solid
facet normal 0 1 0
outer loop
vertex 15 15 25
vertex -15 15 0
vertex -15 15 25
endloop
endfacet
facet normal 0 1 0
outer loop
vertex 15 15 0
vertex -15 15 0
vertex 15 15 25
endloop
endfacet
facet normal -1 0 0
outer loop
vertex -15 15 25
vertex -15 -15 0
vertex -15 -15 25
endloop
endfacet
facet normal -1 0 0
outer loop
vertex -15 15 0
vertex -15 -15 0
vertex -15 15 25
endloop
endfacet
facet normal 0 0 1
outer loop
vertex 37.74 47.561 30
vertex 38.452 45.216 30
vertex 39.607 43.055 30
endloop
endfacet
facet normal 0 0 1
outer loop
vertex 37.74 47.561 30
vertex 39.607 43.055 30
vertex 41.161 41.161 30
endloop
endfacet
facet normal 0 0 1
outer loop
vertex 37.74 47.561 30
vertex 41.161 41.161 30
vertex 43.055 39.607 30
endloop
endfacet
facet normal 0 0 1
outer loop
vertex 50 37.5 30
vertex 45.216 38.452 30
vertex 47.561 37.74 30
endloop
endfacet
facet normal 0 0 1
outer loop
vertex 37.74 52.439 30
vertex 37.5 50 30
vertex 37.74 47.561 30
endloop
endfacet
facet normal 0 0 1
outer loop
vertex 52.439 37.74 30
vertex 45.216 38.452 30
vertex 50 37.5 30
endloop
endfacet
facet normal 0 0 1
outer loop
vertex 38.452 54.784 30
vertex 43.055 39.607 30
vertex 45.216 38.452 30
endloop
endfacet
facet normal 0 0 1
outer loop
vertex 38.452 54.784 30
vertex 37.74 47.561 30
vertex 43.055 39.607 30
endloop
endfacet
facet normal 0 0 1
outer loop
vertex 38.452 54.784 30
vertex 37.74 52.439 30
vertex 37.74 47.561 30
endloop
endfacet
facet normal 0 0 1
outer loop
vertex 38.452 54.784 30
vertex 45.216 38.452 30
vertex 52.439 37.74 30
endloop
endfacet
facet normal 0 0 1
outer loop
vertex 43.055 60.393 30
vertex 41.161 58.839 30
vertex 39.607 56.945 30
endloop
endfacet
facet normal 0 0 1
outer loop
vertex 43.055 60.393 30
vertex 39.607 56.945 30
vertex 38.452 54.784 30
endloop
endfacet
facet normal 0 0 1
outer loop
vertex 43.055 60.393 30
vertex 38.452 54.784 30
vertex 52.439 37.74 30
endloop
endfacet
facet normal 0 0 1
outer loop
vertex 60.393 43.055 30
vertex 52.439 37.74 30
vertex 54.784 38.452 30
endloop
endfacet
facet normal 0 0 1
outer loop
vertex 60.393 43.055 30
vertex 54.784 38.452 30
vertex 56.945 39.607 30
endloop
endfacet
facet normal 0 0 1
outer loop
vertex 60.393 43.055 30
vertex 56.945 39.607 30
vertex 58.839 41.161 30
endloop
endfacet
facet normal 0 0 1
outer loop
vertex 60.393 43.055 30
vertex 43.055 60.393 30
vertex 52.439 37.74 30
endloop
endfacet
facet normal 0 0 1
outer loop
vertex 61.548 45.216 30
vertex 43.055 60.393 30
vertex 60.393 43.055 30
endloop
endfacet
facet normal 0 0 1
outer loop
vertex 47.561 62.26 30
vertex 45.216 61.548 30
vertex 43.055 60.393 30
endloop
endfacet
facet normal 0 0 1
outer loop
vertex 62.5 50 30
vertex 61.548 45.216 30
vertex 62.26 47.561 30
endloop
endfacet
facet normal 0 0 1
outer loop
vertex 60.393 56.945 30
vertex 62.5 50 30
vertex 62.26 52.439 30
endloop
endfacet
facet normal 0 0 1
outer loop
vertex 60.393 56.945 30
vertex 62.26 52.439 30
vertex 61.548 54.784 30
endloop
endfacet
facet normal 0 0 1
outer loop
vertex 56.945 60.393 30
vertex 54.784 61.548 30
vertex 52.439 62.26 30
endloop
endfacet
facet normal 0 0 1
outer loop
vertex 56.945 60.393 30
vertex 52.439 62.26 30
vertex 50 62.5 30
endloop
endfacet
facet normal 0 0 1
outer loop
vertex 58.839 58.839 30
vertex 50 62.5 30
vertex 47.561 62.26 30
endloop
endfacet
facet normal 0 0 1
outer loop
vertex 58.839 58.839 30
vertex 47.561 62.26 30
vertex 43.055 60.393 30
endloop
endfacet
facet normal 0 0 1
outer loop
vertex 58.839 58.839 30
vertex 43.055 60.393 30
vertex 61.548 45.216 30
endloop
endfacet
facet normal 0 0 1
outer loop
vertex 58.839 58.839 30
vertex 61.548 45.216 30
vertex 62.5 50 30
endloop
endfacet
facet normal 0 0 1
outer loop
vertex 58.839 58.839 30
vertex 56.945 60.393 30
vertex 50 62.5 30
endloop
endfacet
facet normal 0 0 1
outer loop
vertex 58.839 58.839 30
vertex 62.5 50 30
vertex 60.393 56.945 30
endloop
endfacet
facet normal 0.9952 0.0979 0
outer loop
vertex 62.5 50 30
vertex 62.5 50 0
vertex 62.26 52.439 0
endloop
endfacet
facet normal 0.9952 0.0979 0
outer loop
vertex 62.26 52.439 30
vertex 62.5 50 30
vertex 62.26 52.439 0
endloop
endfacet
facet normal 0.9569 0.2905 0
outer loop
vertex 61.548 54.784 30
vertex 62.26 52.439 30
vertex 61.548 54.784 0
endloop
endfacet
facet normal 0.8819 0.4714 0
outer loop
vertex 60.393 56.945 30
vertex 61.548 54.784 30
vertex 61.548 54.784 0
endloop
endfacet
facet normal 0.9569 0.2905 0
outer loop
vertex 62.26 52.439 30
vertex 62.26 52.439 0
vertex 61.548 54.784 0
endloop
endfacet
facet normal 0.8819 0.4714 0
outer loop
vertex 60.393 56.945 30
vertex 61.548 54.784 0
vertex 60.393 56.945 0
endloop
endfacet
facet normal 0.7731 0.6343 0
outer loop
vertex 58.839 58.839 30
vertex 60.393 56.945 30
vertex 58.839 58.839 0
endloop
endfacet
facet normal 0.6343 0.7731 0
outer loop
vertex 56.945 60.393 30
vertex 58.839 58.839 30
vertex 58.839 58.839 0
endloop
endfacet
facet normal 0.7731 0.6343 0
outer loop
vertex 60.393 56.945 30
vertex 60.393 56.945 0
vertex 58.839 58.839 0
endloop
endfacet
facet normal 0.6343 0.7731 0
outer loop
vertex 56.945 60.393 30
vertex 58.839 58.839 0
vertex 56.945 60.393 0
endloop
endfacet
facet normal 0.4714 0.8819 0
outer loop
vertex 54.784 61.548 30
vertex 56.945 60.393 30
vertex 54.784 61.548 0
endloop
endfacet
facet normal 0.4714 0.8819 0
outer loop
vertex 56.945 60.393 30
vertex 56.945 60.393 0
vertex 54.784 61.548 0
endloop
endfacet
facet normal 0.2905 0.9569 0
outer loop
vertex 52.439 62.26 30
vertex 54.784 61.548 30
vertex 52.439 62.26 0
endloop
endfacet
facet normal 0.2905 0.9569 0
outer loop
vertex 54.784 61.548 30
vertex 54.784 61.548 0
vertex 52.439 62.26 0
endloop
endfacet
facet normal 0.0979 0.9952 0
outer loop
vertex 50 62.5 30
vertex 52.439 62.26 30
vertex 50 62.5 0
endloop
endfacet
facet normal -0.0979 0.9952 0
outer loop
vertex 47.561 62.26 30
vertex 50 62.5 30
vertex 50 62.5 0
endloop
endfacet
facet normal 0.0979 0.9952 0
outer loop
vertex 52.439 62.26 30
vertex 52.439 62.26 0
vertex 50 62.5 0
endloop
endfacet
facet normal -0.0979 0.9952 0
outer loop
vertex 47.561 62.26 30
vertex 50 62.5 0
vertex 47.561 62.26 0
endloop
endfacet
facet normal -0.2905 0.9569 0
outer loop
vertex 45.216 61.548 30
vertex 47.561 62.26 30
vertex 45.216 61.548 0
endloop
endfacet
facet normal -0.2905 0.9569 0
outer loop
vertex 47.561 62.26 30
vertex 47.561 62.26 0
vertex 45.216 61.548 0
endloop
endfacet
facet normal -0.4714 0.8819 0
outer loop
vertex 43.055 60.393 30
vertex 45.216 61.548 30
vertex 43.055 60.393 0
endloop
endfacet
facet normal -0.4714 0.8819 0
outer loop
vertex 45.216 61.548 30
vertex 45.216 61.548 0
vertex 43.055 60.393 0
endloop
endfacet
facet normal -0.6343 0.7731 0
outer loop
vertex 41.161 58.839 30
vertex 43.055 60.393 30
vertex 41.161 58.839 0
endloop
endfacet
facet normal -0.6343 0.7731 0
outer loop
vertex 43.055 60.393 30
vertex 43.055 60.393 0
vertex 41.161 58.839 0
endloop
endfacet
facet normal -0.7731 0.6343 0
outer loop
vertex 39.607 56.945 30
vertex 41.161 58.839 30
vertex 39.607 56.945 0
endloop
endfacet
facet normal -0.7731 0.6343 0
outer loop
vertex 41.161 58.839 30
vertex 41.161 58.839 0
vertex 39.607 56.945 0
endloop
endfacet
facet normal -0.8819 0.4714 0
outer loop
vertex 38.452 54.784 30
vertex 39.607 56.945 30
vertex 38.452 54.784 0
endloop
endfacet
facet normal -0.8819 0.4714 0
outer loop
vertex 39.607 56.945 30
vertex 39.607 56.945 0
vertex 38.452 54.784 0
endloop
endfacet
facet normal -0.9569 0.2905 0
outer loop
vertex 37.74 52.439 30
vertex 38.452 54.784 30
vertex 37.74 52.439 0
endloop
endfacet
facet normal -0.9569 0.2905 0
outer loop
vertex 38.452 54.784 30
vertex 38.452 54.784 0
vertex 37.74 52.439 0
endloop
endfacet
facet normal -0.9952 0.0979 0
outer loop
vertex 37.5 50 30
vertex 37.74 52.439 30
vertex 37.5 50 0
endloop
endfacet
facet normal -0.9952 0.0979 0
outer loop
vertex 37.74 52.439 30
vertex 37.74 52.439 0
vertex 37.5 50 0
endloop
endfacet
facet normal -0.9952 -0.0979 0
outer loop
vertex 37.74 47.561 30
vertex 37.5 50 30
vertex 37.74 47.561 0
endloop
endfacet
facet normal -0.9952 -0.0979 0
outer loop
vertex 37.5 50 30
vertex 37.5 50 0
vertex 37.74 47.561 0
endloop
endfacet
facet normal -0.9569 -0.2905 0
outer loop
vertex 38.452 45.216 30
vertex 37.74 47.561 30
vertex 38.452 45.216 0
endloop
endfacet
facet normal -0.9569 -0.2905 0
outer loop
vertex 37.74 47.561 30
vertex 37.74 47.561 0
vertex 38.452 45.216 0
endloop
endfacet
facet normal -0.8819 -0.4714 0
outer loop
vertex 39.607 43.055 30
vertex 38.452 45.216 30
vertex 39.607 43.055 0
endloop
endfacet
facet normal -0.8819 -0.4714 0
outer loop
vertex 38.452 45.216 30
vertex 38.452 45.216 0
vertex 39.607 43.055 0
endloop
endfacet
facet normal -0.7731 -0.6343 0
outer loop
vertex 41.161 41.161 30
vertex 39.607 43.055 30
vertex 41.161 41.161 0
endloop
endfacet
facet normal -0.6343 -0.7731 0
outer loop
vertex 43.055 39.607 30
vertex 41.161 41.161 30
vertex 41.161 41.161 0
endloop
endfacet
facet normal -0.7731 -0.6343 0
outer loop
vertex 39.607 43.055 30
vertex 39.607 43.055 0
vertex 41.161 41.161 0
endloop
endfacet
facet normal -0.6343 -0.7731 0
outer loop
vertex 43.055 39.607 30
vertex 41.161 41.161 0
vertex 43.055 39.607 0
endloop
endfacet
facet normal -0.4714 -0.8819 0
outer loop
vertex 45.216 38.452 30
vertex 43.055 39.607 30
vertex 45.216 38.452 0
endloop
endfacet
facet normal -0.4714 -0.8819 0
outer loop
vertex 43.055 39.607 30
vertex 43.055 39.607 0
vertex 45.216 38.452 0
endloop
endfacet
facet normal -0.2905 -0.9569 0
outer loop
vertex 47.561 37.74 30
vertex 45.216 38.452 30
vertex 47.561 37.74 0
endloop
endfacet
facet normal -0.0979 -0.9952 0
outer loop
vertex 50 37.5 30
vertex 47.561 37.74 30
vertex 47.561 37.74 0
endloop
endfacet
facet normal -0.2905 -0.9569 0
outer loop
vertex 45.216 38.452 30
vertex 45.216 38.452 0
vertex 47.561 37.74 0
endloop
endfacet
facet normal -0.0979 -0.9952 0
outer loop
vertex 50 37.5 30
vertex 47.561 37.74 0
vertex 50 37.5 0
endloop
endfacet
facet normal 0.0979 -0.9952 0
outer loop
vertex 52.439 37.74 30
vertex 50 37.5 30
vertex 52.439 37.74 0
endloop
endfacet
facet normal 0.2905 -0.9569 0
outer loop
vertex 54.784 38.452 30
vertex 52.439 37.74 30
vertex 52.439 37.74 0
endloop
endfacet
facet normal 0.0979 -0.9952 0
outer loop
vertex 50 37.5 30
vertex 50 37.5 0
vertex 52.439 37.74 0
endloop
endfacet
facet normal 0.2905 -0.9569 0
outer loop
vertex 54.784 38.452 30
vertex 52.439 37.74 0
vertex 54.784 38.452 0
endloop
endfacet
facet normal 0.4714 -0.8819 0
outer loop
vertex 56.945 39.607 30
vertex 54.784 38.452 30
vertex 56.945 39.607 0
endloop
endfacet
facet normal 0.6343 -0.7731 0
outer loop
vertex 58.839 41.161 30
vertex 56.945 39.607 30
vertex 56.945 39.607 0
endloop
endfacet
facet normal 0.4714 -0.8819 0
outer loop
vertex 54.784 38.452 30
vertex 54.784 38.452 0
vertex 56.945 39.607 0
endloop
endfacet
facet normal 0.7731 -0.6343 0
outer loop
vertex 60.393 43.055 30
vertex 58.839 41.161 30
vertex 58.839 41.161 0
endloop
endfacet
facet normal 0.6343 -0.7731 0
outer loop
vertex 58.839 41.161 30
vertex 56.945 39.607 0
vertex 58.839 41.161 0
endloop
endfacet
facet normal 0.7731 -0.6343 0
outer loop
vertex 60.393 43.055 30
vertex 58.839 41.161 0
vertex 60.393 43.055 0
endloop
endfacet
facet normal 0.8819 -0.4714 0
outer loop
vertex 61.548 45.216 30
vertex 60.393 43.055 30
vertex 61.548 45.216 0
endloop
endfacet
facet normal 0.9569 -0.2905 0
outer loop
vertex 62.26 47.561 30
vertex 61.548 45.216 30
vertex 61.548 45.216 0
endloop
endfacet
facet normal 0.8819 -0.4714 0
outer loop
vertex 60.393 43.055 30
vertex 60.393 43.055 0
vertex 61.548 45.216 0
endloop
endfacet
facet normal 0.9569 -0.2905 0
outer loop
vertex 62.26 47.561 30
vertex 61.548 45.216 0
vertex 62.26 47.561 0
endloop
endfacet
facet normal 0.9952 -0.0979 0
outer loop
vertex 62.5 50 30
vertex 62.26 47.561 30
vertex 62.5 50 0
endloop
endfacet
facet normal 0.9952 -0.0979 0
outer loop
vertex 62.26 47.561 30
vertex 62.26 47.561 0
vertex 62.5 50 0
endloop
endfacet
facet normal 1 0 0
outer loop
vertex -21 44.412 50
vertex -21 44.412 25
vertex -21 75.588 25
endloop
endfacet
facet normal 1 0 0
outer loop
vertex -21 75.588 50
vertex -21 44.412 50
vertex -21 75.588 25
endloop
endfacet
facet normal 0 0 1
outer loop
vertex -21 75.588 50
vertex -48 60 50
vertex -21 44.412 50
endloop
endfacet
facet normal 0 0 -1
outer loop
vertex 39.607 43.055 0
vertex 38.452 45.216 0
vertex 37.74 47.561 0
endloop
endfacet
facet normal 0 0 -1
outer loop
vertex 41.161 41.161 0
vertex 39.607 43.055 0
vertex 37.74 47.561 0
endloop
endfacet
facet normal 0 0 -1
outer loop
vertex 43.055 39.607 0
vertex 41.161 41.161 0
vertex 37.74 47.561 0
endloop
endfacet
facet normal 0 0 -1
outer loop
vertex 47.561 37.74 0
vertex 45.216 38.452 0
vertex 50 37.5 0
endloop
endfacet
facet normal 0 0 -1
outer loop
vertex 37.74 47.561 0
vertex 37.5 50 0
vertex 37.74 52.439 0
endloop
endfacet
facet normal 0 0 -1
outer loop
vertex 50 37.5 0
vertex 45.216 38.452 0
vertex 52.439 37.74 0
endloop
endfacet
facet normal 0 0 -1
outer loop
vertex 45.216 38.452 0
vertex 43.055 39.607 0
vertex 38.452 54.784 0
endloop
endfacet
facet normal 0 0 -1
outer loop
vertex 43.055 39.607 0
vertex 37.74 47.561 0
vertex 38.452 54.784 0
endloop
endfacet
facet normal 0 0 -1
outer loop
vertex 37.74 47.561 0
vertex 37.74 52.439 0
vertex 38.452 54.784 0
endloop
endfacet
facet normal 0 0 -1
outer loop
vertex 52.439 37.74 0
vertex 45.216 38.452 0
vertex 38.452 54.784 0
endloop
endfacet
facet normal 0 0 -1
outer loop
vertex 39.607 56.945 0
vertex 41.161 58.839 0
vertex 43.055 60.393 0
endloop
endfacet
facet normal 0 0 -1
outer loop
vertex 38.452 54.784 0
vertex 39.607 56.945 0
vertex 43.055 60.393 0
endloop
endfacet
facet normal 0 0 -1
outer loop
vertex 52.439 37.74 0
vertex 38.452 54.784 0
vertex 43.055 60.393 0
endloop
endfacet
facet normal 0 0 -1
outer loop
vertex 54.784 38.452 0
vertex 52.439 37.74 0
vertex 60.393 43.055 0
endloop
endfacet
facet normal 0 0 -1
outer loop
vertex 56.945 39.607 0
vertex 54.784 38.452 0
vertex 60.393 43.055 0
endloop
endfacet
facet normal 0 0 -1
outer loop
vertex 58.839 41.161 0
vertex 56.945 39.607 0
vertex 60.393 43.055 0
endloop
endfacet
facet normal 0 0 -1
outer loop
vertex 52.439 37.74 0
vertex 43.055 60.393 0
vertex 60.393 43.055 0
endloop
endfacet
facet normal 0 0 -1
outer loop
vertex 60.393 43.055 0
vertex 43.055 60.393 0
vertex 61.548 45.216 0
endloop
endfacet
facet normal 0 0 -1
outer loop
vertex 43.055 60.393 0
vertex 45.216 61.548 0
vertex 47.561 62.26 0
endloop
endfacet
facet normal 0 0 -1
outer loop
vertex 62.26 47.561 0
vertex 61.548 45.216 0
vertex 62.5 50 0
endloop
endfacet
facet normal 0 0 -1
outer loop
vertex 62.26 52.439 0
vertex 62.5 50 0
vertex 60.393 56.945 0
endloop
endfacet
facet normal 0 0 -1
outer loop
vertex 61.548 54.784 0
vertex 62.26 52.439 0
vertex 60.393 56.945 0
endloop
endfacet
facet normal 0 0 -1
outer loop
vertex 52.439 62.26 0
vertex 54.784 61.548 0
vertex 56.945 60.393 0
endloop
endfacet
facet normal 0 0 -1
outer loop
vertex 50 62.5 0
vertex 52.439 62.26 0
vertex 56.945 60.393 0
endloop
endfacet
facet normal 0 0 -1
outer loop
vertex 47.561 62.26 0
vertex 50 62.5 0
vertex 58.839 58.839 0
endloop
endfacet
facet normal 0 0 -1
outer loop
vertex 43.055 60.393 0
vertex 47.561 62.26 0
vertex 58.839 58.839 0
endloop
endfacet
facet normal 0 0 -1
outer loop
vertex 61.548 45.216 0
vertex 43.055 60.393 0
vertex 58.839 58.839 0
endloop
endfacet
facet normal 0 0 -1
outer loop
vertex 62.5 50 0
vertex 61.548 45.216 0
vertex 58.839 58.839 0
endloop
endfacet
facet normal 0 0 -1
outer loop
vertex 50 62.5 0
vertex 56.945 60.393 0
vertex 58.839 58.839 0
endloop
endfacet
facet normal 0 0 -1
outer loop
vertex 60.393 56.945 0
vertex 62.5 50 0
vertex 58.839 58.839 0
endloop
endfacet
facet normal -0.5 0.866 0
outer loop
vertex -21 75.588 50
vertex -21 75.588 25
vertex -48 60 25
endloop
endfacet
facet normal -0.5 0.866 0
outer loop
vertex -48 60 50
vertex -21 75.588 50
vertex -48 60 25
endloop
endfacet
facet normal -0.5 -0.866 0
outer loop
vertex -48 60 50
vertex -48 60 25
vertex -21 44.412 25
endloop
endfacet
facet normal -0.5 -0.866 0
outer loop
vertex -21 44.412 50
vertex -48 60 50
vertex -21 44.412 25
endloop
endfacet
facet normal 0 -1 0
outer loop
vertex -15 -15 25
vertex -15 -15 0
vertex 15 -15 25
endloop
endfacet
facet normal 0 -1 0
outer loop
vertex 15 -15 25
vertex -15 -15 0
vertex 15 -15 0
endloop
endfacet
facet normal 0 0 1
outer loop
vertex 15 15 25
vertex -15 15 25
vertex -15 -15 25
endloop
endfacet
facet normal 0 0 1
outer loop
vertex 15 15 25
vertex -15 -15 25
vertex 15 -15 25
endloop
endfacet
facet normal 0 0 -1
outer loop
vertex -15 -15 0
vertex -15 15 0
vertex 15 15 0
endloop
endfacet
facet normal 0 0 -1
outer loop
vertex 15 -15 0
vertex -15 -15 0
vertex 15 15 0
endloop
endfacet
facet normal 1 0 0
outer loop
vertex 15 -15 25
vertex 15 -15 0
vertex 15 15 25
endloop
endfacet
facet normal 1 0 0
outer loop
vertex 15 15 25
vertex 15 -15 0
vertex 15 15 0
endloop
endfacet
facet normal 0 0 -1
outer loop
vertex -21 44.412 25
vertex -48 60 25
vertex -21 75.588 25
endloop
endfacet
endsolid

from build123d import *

# Parameters (mm, degrees)
F0_W     = 30
F0_H     = 30
F1_DEPTH = 25
F0_R     = 12.5
F2_DEPTH = 30
F5_DEPTH = 25


with BuildPart() as f1:
    # F0 (on Top) → F1 (new body)
    with BuildSketch(Plane.XY):
        Rectangle(F0_W, F0_H)
    extrude(amount=F1_DEPTH)


with BuildPart() as f2:
    # F0 (on Top) → F2 (new body)
    with BuildSketch(Plane.XY):
        with Locations((50, 50)):
            Circle(F0_R)
    extrude(amount=F2_DEPTH)


with BuildPart() as f5:
    # F4 (on offset) → F5 (new body)
    with BuildSketch(Plane.XY.offset(25)):
        Polygon((-48, 60), (-21, 44.411543), (-21, 75.588457), align=None)
    extrude(amount=F5_DEPTH)


solid = Compound([f1.part, f2.part, f5.part])
